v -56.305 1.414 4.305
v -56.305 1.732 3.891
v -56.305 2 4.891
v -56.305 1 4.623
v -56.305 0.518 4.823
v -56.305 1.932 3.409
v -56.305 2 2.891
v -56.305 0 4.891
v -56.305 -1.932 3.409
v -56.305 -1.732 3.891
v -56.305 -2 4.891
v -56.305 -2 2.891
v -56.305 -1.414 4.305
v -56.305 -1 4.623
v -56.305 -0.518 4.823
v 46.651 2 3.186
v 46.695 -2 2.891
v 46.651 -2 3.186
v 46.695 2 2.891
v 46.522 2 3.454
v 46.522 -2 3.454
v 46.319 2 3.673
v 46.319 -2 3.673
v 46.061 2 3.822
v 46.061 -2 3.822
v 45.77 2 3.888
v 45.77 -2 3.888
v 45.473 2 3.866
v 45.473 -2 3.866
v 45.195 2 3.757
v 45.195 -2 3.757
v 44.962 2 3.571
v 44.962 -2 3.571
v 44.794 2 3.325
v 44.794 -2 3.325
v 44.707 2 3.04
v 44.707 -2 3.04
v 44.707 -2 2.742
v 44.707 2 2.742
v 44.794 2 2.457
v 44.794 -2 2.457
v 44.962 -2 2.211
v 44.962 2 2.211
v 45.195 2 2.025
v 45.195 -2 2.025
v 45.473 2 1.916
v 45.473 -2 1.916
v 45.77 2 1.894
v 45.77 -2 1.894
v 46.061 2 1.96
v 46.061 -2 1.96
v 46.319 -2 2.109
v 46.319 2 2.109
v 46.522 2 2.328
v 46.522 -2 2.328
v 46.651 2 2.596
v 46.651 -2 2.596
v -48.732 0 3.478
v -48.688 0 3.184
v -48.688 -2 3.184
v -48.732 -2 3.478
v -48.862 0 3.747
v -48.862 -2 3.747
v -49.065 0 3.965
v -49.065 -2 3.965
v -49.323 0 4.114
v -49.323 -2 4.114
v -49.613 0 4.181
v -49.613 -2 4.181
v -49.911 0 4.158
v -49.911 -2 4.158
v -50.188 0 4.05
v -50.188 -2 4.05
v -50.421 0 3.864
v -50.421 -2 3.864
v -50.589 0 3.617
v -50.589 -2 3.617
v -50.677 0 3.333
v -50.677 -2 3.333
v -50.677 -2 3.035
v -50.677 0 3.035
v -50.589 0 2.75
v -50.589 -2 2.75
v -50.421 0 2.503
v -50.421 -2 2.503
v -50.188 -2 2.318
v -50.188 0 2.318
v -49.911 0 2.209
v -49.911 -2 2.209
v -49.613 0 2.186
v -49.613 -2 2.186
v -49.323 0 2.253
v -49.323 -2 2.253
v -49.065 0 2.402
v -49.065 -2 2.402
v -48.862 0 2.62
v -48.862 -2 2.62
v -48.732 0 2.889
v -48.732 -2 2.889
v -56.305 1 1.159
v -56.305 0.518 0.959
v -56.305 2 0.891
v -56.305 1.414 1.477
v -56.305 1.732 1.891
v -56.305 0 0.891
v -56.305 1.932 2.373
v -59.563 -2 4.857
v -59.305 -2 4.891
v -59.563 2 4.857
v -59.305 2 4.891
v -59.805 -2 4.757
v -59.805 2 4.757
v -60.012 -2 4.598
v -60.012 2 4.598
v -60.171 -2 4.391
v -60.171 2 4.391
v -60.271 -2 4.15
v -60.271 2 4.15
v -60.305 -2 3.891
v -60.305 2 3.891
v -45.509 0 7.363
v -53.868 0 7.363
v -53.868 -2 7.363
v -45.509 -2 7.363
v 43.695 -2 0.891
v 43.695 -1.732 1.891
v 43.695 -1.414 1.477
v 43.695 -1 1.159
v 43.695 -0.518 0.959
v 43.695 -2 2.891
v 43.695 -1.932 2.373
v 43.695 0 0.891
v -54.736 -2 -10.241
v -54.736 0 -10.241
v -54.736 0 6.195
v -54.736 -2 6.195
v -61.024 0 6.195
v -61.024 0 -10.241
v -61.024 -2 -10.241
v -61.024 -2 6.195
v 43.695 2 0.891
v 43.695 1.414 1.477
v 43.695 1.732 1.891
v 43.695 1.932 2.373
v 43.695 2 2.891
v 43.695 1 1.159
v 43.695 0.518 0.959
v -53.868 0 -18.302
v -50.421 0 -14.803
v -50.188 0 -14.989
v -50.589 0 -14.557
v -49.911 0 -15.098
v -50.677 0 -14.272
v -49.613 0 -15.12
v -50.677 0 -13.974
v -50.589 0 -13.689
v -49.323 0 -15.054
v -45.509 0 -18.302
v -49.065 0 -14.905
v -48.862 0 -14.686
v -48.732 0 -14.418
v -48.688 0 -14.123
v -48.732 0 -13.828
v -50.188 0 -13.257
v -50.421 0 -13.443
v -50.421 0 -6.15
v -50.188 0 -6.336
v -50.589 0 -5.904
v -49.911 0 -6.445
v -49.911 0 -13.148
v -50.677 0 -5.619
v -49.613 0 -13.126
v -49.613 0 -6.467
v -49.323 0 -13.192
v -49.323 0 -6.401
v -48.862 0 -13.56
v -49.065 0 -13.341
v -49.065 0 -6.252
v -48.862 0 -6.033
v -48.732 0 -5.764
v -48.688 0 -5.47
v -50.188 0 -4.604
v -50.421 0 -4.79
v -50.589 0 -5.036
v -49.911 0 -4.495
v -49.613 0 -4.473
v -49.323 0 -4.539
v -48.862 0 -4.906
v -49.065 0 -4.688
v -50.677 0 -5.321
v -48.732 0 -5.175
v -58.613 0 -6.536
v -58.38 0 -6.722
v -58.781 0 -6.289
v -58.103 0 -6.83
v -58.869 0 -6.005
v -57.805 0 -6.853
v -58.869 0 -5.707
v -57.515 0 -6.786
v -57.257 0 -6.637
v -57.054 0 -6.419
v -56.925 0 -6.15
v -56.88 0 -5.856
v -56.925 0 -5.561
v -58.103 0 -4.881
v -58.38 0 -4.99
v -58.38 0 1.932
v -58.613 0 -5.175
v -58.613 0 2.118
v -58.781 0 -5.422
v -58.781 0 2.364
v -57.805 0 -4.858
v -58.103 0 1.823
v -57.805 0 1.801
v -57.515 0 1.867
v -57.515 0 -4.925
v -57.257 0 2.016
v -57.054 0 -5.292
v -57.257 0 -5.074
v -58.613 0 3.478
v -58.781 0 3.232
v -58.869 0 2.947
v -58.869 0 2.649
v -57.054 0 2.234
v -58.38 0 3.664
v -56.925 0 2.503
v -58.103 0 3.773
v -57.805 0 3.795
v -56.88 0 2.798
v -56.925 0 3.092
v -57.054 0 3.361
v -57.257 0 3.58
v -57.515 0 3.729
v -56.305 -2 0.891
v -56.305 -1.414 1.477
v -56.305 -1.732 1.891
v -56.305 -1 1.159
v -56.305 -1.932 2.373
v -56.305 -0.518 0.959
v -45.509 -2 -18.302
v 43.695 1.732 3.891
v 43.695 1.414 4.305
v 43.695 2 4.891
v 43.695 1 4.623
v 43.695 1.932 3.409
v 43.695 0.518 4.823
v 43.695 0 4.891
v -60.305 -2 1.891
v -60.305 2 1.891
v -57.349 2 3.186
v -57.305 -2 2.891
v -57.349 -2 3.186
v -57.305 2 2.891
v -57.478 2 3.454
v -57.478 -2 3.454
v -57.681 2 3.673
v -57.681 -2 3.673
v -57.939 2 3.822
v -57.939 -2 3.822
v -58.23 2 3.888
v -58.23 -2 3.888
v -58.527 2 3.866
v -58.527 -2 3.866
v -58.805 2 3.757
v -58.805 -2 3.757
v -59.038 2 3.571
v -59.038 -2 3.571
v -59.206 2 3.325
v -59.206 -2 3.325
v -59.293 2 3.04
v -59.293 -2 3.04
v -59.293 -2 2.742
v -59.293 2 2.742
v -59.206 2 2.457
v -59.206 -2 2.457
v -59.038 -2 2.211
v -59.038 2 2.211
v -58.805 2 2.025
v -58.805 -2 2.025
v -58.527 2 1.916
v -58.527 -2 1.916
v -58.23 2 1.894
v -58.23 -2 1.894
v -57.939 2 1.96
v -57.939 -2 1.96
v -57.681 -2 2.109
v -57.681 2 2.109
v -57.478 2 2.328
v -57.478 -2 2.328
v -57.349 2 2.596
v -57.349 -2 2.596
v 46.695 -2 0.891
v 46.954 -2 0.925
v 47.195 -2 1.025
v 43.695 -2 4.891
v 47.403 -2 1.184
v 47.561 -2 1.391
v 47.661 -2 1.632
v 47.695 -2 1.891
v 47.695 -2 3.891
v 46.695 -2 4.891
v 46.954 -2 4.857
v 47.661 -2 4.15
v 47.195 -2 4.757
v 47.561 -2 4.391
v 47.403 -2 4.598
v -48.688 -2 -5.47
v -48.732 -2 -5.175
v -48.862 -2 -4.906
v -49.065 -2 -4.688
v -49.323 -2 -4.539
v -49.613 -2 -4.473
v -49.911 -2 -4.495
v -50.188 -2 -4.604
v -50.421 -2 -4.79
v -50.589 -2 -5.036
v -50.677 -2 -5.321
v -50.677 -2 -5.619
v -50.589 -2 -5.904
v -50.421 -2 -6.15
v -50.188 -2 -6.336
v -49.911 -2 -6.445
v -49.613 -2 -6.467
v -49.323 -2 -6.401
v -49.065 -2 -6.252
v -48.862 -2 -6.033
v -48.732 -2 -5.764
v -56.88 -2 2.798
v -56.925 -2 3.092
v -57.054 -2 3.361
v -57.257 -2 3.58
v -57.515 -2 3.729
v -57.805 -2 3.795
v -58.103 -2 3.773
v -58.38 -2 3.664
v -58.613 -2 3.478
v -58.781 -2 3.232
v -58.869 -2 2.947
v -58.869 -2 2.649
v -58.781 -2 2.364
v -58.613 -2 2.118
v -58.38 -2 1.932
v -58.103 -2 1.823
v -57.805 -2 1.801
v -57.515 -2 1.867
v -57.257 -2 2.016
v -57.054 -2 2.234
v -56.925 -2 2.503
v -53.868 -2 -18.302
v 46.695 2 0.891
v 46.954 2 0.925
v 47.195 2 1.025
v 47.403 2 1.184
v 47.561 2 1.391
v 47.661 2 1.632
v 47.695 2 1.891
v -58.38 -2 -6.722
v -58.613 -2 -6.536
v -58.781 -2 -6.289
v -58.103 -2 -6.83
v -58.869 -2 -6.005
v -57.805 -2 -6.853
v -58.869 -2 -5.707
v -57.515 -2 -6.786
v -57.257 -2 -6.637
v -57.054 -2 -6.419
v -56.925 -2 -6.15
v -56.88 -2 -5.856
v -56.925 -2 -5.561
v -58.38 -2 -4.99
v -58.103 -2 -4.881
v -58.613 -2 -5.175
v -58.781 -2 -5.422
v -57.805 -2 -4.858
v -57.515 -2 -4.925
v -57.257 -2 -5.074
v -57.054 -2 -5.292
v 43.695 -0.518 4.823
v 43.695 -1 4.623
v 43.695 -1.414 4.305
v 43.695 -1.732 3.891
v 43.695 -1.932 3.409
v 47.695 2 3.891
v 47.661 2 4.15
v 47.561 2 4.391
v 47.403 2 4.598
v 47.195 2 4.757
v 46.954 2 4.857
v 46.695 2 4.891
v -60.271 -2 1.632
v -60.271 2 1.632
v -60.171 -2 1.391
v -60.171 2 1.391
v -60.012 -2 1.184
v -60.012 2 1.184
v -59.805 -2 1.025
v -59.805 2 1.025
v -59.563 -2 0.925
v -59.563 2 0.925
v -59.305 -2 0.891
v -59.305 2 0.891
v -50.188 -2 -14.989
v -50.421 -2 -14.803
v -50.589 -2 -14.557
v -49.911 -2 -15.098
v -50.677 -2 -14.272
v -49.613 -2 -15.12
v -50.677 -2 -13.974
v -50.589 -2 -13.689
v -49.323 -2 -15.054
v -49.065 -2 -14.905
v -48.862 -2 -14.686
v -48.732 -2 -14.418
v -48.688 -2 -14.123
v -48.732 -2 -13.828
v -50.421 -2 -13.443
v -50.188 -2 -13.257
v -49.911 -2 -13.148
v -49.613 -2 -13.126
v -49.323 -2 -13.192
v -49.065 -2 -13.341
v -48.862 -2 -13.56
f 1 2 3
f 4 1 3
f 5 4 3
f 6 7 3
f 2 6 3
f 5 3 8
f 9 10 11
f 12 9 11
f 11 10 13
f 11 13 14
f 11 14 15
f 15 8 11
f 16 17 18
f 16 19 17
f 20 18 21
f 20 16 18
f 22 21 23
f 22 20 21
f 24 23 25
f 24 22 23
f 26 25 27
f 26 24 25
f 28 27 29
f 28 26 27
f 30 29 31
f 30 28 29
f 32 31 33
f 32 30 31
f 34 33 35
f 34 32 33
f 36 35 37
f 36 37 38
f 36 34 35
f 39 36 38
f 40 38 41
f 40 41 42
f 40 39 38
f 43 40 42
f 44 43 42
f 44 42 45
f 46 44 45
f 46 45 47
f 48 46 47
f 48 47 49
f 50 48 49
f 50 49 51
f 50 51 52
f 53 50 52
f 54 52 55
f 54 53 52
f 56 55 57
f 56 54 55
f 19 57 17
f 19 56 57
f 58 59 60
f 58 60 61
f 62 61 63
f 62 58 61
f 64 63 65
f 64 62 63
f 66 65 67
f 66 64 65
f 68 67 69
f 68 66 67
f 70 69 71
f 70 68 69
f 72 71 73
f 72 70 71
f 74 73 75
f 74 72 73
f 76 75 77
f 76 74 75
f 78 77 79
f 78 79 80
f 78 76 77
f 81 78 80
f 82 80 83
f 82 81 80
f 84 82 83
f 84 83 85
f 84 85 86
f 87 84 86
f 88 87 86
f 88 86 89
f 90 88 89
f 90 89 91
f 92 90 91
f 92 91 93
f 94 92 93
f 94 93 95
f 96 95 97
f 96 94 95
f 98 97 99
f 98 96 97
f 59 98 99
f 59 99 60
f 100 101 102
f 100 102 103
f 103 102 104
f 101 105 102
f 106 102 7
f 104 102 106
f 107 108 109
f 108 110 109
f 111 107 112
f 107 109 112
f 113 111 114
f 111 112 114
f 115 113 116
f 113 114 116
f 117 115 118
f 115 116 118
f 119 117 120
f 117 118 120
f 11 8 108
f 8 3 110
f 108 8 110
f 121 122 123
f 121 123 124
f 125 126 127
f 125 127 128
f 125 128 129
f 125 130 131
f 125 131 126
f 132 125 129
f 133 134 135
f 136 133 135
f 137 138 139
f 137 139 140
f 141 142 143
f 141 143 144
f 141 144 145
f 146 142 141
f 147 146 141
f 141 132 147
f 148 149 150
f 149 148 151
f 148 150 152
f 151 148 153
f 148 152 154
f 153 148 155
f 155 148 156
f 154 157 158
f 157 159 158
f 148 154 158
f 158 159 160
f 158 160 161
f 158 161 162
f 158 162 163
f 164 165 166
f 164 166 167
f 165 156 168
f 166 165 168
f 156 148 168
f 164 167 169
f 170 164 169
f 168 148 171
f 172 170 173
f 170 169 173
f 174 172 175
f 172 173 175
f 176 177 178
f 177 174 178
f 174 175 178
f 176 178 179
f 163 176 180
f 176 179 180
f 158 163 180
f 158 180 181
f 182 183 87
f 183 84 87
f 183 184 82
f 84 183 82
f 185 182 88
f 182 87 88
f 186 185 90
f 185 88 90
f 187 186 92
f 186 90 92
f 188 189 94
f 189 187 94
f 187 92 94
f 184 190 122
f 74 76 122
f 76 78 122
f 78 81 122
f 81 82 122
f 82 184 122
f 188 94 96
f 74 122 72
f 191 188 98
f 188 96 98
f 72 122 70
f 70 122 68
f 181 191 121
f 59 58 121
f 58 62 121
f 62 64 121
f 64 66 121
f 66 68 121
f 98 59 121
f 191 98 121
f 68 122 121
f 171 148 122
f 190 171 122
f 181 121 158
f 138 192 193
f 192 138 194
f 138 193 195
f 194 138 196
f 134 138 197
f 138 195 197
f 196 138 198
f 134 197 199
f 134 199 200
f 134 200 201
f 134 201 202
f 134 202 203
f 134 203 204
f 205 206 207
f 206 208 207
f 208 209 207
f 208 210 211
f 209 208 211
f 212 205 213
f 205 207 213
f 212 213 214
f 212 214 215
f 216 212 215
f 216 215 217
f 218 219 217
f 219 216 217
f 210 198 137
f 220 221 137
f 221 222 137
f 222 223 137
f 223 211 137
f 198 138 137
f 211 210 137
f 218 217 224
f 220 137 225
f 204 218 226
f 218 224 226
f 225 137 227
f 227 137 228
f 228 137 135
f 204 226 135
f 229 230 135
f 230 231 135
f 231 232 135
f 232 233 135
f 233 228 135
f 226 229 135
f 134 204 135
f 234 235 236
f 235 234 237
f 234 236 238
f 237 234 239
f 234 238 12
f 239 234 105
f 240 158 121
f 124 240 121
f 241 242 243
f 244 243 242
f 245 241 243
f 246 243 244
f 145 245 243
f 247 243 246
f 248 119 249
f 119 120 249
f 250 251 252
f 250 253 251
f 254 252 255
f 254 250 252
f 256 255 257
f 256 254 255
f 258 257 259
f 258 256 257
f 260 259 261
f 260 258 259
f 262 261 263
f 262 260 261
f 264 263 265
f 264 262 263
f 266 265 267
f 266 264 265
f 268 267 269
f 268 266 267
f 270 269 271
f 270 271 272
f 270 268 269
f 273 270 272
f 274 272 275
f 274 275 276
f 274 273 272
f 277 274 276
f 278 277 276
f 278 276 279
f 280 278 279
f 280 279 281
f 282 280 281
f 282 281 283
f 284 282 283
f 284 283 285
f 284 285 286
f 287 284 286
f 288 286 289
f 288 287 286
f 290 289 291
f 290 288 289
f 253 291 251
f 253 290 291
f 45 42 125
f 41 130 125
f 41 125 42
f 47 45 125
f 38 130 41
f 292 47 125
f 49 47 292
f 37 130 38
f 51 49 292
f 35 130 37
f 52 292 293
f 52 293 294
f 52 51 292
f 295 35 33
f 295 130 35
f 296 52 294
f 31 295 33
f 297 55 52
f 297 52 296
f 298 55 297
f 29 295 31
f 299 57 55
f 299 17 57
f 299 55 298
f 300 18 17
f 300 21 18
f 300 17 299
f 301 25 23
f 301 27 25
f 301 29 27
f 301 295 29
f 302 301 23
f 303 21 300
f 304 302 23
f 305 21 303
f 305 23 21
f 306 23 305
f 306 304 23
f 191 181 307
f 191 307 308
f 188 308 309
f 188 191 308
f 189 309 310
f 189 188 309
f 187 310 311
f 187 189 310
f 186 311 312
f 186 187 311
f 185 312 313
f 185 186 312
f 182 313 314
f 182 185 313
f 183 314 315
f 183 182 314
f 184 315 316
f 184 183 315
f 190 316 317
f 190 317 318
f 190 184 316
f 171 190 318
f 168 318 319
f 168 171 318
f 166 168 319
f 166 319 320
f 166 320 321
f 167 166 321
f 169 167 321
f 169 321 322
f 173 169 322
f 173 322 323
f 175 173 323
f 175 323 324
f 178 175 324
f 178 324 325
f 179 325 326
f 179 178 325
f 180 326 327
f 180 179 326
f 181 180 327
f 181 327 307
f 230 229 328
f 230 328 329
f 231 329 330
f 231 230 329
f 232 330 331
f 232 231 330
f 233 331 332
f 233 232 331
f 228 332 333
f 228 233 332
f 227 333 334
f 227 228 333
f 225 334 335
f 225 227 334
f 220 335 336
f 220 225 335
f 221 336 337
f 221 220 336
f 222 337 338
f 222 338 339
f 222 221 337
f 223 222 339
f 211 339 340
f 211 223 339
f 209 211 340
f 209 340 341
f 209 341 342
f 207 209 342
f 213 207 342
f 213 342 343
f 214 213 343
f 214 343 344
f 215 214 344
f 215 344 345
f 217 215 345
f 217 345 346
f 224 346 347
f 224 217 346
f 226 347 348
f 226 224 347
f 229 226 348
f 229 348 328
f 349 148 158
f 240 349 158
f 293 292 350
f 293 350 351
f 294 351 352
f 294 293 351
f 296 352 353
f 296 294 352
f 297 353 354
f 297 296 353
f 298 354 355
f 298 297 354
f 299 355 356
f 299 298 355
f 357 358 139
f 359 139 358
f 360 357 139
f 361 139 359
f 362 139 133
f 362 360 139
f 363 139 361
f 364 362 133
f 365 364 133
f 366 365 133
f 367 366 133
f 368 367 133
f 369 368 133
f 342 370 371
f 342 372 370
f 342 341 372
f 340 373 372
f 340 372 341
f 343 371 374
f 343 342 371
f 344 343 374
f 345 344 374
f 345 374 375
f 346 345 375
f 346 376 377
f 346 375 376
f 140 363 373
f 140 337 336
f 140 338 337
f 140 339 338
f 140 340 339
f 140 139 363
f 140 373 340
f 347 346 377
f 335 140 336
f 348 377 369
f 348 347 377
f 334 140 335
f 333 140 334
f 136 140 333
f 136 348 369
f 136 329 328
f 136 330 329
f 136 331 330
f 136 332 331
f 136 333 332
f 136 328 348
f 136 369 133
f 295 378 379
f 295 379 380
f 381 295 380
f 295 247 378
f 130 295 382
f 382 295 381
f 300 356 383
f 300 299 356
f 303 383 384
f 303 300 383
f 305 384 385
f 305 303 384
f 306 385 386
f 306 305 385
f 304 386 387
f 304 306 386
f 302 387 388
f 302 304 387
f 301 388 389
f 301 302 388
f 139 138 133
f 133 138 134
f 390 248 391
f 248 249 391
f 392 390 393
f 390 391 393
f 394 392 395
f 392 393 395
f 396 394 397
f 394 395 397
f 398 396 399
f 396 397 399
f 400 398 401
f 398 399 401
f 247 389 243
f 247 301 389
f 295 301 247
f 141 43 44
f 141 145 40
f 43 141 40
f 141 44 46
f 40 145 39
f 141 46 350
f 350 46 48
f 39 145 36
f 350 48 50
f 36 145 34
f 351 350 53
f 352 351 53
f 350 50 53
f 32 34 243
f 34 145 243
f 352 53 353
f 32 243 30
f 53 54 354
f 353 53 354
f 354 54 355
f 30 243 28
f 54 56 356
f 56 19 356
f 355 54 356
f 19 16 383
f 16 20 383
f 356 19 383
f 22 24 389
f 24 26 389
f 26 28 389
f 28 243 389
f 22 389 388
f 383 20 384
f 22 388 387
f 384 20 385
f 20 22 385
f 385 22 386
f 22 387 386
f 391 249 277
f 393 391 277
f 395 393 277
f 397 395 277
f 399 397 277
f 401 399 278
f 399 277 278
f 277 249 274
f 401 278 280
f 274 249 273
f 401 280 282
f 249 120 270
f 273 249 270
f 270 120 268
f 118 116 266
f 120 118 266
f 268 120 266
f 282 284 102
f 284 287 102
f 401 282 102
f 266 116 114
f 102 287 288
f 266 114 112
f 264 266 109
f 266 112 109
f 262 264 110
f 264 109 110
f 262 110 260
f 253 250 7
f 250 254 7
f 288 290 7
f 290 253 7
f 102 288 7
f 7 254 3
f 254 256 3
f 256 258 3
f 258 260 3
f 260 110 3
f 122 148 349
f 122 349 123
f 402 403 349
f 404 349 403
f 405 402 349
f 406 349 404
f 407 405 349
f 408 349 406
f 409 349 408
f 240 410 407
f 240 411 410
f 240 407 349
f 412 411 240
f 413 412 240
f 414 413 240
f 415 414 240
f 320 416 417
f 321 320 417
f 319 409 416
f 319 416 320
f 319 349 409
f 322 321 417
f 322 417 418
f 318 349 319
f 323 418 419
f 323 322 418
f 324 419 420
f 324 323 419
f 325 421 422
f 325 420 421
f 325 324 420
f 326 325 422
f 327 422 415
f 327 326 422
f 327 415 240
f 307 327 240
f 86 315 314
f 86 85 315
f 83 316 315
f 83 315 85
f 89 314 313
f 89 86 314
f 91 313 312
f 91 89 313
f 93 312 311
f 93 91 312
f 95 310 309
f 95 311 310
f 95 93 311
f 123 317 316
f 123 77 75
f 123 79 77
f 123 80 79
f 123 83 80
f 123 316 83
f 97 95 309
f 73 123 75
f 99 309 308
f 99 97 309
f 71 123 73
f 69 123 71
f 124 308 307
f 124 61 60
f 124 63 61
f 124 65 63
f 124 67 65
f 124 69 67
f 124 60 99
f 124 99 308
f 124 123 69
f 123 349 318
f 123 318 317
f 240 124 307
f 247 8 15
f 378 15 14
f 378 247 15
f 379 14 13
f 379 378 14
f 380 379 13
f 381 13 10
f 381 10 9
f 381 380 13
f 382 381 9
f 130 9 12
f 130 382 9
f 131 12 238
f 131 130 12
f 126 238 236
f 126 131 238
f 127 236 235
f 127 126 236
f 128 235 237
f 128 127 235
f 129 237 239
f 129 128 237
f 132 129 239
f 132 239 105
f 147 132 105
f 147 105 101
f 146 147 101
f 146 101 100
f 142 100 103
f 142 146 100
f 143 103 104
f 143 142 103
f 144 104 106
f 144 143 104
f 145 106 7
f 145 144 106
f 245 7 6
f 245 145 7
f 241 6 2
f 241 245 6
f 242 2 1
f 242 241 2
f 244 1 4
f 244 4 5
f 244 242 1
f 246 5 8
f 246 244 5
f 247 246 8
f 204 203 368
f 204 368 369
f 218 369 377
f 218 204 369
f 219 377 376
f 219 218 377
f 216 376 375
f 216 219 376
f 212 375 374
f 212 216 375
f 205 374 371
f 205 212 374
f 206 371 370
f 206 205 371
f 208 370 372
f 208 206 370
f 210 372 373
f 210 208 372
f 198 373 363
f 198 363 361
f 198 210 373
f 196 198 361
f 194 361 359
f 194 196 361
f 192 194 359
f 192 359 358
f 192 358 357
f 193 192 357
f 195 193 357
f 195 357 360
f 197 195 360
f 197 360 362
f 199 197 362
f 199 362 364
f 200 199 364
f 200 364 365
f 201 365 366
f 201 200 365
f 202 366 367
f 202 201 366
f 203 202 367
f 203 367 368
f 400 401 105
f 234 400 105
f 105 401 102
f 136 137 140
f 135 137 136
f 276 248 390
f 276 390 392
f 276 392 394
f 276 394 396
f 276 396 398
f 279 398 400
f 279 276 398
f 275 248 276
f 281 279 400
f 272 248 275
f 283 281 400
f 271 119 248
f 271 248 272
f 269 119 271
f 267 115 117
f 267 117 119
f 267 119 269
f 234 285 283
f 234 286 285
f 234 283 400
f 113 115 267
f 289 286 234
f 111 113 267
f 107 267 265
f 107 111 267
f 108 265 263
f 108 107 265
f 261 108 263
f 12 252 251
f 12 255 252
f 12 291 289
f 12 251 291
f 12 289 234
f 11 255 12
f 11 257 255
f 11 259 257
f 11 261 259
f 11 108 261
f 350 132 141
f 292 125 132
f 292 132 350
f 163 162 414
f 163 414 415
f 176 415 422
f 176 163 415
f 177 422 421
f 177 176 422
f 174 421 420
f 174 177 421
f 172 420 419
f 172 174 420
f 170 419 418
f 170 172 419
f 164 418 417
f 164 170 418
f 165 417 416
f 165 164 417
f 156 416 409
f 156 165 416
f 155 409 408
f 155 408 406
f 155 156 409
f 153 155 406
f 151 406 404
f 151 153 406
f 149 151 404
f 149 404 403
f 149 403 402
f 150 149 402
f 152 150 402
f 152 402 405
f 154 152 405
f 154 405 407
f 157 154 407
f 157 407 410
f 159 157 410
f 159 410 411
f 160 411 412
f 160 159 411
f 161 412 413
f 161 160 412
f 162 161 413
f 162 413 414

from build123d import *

# Parameters (mm, degrees)
F0_W     = 100
F0_H     = 2
F0_R     = 1
F2_DEPTH = 2
F3_W     = 6.2882156768
F3_H     = 16.4366154931
F3_R     = 1
F4_DEPTH = 2
F5_W     = 8.3588625378
F5_H     = 25.6652788855
F5_R     = 1
F6_DEPTH = 2


with BuildPart() as f1:
    # F0 (on Front) → F1 (revolve)
    with BuildSketch(Plane.XZ):
        with Locations((-6.3045942187, 3.8910947517)):
            Rectangle(F0_W, F0_H)
    revolve(axis=Axis((-6.3045942187, 0, 2.8910947517), (1, 0, 0)))

    # F0 (on Front) → F2 (join, symmetric)
    with BuildSketch(Plane.XZ):
        with BuildLine():
            Line((-56.3045942187, 2.8910947517), (-56.3045942187, 4.8910947517))
            Line((-56.3045942187, 4.8910947517), (-59.3045942187, 4.8910947517))
            ThreePointArc((-59.3045942187, 4.8910947517), (-60.011701, 4.5982015329), (-60.3045942187, 3.8910947517))
            Line((-60.3045942187, 3.8910947517), (-60.3045942187, 1.8910947517))
            ThreePointArc((-60.3045942187, 1.8910947517), (-60.011701, 1.1839879704), (-59.3045942187, 0.8910947517))
            Line((-59.3045942187, 0.8910947517), (-56.3045942187, 0.8910947517))
            Line((-56.3045942187, 0.8910947517), (-56.3045942187, 2.8910947517))
        make_face()
        with Locations((-58.3045942187, 2.8910947517)):
            Circle(F0_R, mode=Mode.SUBTRACT)
        with BuildLine():
            Line((46.6954057813, 4.8910947517), (43.6954057813, 4.8910947517))
            Line((43.6954057813, 4.8910947517), (43.6954057813, 2.8910947517))
            Line((43.6954057813, 2.8910947517), (43.6954057813, 0.8910947517))
            Line((43.6954057813, 0.8910947517), (46.6954057813, 0.8910947517))
            ThreePointArc((46.6954057813, 0.8910947517), (47.4025125625, 1.1839879705), (47.6954057813, 1.8910947517))
            Line((47.6954057813, 1.8910947517), (47.6954057813, 3.8910947517))
            ThreePointArc((47.6954057813, 3.8910947517), (47.4025125625, 4.5982015328), (46.6954057813, 4.8910947517))
        make_face()
        with Locations((45.6954057813, 2.8910947517)):
            Circle(F0_R, mode=Mode.SUBTRACT)
    extrude(amount=F2_DEPTH, both=True)


with BuildPart() as f4:
    # F3 (on Front) → F4 (new body)
    with BuildSketch(Plane.XZ):
        with Locations((-57.8802218475, -2.0229713348)):
            Rectangle(F3_W, F3_H)
        with Locations((-57.8802218475, -5.8555478984)):
            Circle(F3_R, mode=Mode.SUBTRACT)
        with Locations((-57.8802218475, 2.797742829)):
            Circle(F3_R, mode=Mode.SUBTRACT)
    extrude(amount=F4_DEPTH)


with BuildPart() as f6:
    # F5 (on Front) → F6 (new body)
    with BuildSketch(Plane.XZ):
        with Locations((-49.6881123006, -5.4697235934)):
            Rectangle(F5_W, F5_H)
        with Locations((-49.6880297471, -14.1228492146)):
            Circle(F5_R, mode=Mode.SUBTRACT)
        with Locations((-49.6880297471, -5.4697235934)):
            Circle(F5_R, mode=Mode.SUBTRACT)
        with Locations((-49.6880297471, 3.1835671339)):
            Circle(F5_R, mode=Mode.SUBTRACT)
    extrude(amount=F6_DEPTH)


solid = Compound([f1.part, f4.part, f6.part])
